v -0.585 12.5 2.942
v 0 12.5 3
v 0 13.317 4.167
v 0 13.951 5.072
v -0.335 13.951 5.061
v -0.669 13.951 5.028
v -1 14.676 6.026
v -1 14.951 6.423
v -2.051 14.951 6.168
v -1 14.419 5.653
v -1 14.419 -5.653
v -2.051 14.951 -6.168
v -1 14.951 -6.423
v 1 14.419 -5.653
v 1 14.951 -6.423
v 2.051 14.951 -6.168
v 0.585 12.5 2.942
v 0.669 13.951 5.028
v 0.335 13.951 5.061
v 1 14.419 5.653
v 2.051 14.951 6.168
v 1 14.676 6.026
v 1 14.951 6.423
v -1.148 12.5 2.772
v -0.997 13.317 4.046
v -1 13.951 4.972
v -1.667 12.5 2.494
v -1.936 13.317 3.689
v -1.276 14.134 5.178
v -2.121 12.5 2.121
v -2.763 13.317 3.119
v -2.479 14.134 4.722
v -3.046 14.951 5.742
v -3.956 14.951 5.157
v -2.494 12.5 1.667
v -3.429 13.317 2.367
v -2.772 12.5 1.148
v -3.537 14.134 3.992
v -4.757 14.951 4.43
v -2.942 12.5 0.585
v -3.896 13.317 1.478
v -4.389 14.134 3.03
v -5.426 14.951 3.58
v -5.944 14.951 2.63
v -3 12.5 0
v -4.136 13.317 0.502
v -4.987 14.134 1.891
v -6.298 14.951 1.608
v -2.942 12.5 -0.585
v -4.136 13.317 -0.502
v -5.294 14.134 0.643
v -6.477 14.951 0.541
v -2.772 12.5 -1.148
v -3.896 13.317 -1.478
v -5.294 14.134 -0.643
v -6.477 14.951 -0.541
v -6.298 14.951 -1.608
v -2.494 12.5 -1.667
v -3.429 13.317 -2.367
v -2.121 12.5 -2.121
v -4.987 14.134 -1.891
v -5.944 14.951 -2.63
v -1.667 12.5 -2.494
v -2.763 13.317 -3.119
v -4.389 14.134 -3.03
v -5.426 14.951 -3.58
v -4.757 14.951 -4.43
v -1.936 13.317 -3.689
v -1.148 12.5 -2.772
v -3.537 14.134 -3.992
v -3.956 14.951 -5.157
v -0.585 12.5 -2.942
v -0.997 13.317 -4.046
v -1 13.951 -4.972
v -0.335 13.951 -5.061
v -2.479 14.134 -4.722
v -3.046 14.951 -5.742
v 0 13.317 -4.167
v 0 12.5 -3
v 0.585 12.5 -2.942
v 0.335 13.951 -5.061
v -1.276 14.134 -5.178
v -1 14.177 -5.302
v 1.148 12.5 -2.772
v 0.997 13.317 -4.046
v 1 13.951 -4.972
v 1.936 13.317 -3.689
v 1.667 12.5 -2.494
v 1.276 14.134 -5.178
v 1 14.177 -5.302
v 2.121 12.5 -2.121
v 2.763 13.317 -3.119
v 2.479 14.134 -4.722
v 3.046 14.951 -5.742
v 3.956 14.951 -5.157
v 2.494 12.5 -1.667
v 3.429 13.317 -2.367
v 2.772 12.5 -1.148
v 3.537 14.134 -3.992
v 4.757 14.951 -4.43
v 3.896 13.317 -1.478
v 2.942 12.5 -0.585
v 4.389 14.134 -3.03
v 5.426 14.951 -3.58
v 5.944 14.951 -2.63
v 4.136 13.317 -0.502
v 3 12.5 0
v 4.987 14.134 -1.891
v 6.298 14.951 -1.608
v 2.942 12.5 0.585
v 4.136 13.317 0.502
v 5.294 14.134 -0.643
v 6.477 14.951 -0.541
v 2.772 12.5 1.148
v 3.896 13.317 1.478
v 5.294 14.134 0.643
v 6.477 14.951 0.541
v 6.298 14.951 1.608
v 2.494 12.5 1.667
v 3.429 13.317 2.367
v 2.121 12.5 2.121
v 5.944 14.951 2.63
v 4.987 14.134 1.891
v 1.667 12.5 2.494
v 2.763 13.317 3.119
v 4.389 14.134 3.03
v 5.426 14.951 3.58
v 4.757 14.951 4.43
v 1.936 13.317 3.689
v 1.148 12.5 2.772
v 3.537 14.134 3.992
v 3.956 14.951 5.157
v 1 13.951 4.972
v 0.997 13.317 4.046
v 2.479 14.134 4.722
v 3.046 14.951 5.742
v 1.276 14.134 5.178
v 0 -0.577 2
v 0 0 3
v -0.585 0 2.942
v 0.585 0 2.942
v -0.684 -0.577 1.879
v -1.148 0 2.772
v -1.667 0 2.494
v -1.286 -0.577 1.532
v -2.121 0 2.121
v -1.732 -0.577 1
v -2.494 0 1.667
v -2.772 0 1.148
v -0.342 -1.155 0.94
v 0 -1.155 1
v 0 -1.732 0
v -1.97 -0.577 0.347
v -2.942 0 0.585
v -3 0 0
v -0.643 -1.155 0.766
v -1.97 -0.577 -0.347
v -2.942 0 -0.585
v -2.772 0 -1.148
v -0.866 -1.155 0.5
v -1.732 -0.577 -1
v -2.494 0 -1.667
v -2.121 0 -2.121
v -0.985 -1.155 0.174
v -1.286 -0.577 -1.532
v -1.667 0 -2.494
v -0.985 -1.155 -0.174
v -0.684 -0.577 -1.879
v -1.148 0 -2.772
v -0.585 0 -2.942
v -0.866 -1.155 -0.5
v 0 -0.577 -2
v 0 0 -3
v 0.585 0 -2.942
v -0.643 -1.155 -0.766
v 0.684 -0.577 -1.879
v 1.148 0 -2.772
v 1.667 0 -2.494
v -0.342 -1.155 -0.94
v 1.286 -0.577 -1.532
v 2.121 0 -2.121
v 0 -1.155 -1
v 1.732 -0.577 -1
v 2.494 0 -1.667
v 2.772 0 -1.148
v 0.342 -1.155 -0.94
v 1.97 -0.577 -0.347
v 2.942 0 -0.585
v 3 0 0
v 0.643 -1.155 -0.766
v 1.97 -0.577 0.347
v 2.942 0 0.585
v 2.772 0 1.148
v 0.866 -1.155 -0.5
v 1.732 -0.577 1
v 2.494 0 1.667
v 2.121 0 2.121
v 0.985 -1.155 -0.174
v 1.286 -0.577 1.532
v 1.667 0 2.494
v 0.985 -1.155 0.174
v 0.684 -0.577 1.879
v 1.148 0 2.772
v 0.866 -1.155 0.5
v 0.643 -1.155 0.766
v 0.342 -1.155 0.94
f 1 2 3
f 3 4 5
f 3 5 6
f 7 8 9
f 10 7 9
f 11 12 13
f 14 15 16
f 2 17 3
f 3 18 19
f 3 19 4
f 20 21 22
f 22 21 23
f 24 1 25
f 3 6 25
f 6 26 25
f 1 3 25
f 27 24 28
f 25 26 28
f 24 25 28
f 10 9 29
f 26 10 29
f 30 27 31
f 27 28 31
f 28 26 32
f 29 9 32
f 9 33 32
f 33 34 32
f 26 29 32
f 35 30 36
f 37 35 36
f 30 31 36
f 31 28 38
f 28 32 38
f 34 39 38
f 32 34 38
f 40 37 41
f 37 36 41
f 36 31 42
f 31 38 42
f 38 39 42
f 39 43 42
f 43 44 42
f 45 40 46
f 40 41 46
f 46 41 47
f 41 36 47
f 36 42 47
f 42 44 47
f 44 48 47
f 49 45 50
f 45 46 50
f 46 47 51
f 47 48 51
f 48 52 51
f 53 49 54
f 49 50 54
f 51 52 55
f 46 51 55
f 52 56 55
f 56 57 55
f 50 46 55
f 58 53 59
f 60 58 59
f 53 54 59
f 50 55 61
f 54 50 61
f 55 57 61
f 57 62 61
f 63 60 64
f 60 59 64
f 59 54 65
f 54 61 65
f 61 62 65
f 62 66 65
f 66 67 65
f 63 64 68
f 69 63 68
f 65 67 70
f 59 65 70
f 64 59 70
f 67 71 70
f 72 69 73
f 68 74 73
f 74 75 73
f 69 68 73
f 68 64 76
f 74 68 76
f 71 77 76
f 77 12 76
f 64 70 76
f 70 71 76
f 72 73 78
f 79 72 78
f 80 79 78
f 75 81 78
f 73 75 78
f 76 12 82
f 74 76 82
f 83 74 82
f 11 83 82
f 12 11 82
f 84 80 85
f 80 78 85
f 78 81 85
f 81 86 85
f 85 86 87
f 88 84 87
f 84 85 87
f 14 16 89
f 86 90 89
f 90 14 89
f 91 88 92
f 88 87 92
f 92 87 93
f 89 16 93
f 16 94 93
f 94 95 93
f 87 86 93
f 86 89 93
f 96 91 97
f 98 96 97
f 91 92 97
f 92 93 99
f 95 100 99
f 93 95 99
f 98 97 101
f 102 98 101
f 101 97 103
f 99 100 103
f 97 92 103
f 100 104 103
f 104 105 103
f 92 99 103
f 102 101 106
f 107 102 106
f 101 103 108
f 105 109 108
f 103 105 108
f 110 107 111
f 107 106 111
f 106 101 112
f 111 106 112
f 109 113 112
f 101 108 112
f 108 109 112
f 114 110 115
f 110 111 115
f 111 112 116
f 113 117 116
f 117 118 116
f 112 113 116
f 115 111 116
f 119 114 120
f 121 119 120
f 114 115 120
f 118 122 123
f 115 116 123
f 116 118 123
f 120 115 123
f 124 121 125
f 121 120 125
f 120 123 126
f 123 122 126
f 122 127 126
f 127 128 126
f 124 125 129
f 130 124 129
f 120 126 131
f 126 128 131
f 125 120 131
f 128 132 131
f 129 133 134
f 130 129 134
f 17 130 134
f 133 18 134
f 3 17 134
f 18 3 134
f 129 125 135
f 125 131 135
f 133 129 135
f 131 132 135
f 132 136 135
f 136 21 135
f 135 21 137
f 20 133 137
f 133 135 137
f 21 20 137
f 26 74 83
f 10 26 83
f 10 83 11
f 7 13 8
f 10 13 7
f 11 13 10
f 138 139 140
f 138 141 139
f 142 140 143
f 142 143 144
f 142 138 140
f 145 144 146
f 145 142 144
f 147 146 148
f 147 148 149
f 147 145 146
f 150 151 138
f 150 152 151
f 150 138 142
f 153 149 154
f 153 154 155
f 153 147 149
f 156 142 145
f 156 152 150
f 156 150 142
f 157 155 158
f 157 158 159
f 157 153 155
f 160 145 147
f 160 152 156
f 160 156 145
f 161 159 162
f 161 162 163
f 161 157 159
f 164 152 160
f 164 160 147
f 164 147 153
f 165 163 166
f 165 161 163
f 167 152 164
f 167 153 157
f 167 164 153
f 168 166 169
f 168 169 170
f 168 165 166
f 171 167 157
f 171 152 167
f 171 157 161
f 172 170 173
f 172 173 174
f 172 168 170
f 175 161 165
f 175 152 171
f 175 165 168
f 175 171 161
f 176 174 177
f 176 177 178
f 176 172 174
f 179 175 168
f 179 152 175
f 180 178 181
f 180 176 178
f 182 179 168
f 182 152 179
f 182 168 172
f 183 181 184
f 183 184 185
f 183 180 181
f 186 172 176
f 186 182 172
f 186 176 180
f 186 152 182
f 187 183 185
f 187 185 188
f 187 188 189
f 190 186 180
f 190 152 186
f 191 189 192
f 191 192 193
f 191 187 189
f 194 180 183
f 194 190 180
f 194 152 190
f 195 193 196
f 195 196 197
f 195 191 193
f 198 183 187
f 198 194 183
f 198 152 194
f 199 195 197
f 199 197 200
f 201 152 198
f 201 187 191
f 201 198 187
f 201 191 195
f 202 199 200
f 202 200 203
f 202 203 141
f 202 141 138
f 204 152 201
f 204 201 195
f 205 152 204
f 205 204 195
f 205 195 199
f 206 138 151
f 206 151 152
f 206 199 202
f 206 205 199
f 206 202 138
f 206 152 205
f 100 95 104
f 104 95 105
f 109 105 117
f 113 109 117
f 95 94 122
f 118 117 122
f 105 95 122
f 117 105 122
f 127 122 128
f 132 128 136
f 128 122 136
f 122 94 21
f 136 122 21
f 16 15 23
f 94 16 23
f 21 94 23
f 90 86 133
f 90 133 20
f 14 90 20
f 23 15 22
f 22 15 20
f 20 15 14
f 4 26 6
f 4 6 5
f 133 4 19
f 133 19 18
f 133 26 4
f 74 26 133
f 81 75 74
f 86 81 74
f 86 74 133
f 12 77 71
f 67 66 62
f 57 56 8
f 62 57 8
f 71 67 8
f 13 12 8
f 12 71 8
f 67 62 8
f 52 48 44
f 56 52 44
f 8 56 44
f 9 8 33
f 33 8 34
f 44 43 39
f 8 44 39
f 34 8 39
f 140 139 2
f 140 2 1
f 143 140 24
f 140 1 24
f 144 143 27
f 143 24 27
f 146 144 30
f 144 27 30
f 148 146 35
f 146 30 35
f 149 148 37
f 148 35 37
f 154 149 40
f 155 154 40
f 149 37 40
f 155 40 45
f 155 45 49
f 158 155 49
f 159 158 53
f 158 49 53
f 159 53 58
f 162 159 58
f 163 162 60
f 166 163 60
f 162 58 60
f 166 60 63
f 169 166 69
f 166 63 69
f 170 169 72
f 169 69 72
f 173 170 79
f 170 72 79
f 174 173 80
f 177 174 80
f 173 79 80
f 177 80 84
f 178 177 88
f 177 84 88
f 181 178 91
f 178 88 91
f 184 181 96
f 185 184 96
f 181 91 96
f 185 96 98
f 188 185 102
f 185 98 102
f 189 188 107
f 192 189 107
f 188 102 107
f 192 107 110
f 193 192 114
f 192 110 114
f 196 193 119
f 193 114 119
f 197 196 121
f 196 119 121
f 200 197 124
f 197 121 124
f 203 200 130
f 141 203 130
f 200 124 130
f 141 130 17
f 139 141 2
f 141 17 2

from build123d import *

# Parameters (mm, degrees)
CUT_EXTRUDE1_DEPTH      = 18.550618775
CUT_EXTRUDE1_DEPTH_BACK = 18.550618775
SKETCH1_4_W             = 2
SKETCH1_4_H             = 1


with BuildPart() as part:
    # Sketch1 → Revolve1 (revolve)
    with BuildSketch(Plane.XY):
        Polygon((0, -1.732050808), (3, 0), (3, 12.5), (6.5, 14.950726384), (0, 14.950726384), align=None)
    revolve(axis=Axis((0, 14.950726384, 0), (0, -1, 0)))

    # Sketch1<4> → Cut-Extrude1 (cut, two sides: drawn at the far end of the back side and taken through both)
    with BuildSketch(Plane.XY.offset(-CUT_EXTRUDE1_DEPTH_BACK)):
        with Locations((0, 14.450726384)):
            Rectangle(SKETCH1_4_W, SKETCH1_4_H)
    extrude(amount=CUT_EXTRUDE1_DEPTH + CUT_EXTRUDE1_DEPTH_BACK, mode=Mode.SUBTRACT)


solid = part.part
